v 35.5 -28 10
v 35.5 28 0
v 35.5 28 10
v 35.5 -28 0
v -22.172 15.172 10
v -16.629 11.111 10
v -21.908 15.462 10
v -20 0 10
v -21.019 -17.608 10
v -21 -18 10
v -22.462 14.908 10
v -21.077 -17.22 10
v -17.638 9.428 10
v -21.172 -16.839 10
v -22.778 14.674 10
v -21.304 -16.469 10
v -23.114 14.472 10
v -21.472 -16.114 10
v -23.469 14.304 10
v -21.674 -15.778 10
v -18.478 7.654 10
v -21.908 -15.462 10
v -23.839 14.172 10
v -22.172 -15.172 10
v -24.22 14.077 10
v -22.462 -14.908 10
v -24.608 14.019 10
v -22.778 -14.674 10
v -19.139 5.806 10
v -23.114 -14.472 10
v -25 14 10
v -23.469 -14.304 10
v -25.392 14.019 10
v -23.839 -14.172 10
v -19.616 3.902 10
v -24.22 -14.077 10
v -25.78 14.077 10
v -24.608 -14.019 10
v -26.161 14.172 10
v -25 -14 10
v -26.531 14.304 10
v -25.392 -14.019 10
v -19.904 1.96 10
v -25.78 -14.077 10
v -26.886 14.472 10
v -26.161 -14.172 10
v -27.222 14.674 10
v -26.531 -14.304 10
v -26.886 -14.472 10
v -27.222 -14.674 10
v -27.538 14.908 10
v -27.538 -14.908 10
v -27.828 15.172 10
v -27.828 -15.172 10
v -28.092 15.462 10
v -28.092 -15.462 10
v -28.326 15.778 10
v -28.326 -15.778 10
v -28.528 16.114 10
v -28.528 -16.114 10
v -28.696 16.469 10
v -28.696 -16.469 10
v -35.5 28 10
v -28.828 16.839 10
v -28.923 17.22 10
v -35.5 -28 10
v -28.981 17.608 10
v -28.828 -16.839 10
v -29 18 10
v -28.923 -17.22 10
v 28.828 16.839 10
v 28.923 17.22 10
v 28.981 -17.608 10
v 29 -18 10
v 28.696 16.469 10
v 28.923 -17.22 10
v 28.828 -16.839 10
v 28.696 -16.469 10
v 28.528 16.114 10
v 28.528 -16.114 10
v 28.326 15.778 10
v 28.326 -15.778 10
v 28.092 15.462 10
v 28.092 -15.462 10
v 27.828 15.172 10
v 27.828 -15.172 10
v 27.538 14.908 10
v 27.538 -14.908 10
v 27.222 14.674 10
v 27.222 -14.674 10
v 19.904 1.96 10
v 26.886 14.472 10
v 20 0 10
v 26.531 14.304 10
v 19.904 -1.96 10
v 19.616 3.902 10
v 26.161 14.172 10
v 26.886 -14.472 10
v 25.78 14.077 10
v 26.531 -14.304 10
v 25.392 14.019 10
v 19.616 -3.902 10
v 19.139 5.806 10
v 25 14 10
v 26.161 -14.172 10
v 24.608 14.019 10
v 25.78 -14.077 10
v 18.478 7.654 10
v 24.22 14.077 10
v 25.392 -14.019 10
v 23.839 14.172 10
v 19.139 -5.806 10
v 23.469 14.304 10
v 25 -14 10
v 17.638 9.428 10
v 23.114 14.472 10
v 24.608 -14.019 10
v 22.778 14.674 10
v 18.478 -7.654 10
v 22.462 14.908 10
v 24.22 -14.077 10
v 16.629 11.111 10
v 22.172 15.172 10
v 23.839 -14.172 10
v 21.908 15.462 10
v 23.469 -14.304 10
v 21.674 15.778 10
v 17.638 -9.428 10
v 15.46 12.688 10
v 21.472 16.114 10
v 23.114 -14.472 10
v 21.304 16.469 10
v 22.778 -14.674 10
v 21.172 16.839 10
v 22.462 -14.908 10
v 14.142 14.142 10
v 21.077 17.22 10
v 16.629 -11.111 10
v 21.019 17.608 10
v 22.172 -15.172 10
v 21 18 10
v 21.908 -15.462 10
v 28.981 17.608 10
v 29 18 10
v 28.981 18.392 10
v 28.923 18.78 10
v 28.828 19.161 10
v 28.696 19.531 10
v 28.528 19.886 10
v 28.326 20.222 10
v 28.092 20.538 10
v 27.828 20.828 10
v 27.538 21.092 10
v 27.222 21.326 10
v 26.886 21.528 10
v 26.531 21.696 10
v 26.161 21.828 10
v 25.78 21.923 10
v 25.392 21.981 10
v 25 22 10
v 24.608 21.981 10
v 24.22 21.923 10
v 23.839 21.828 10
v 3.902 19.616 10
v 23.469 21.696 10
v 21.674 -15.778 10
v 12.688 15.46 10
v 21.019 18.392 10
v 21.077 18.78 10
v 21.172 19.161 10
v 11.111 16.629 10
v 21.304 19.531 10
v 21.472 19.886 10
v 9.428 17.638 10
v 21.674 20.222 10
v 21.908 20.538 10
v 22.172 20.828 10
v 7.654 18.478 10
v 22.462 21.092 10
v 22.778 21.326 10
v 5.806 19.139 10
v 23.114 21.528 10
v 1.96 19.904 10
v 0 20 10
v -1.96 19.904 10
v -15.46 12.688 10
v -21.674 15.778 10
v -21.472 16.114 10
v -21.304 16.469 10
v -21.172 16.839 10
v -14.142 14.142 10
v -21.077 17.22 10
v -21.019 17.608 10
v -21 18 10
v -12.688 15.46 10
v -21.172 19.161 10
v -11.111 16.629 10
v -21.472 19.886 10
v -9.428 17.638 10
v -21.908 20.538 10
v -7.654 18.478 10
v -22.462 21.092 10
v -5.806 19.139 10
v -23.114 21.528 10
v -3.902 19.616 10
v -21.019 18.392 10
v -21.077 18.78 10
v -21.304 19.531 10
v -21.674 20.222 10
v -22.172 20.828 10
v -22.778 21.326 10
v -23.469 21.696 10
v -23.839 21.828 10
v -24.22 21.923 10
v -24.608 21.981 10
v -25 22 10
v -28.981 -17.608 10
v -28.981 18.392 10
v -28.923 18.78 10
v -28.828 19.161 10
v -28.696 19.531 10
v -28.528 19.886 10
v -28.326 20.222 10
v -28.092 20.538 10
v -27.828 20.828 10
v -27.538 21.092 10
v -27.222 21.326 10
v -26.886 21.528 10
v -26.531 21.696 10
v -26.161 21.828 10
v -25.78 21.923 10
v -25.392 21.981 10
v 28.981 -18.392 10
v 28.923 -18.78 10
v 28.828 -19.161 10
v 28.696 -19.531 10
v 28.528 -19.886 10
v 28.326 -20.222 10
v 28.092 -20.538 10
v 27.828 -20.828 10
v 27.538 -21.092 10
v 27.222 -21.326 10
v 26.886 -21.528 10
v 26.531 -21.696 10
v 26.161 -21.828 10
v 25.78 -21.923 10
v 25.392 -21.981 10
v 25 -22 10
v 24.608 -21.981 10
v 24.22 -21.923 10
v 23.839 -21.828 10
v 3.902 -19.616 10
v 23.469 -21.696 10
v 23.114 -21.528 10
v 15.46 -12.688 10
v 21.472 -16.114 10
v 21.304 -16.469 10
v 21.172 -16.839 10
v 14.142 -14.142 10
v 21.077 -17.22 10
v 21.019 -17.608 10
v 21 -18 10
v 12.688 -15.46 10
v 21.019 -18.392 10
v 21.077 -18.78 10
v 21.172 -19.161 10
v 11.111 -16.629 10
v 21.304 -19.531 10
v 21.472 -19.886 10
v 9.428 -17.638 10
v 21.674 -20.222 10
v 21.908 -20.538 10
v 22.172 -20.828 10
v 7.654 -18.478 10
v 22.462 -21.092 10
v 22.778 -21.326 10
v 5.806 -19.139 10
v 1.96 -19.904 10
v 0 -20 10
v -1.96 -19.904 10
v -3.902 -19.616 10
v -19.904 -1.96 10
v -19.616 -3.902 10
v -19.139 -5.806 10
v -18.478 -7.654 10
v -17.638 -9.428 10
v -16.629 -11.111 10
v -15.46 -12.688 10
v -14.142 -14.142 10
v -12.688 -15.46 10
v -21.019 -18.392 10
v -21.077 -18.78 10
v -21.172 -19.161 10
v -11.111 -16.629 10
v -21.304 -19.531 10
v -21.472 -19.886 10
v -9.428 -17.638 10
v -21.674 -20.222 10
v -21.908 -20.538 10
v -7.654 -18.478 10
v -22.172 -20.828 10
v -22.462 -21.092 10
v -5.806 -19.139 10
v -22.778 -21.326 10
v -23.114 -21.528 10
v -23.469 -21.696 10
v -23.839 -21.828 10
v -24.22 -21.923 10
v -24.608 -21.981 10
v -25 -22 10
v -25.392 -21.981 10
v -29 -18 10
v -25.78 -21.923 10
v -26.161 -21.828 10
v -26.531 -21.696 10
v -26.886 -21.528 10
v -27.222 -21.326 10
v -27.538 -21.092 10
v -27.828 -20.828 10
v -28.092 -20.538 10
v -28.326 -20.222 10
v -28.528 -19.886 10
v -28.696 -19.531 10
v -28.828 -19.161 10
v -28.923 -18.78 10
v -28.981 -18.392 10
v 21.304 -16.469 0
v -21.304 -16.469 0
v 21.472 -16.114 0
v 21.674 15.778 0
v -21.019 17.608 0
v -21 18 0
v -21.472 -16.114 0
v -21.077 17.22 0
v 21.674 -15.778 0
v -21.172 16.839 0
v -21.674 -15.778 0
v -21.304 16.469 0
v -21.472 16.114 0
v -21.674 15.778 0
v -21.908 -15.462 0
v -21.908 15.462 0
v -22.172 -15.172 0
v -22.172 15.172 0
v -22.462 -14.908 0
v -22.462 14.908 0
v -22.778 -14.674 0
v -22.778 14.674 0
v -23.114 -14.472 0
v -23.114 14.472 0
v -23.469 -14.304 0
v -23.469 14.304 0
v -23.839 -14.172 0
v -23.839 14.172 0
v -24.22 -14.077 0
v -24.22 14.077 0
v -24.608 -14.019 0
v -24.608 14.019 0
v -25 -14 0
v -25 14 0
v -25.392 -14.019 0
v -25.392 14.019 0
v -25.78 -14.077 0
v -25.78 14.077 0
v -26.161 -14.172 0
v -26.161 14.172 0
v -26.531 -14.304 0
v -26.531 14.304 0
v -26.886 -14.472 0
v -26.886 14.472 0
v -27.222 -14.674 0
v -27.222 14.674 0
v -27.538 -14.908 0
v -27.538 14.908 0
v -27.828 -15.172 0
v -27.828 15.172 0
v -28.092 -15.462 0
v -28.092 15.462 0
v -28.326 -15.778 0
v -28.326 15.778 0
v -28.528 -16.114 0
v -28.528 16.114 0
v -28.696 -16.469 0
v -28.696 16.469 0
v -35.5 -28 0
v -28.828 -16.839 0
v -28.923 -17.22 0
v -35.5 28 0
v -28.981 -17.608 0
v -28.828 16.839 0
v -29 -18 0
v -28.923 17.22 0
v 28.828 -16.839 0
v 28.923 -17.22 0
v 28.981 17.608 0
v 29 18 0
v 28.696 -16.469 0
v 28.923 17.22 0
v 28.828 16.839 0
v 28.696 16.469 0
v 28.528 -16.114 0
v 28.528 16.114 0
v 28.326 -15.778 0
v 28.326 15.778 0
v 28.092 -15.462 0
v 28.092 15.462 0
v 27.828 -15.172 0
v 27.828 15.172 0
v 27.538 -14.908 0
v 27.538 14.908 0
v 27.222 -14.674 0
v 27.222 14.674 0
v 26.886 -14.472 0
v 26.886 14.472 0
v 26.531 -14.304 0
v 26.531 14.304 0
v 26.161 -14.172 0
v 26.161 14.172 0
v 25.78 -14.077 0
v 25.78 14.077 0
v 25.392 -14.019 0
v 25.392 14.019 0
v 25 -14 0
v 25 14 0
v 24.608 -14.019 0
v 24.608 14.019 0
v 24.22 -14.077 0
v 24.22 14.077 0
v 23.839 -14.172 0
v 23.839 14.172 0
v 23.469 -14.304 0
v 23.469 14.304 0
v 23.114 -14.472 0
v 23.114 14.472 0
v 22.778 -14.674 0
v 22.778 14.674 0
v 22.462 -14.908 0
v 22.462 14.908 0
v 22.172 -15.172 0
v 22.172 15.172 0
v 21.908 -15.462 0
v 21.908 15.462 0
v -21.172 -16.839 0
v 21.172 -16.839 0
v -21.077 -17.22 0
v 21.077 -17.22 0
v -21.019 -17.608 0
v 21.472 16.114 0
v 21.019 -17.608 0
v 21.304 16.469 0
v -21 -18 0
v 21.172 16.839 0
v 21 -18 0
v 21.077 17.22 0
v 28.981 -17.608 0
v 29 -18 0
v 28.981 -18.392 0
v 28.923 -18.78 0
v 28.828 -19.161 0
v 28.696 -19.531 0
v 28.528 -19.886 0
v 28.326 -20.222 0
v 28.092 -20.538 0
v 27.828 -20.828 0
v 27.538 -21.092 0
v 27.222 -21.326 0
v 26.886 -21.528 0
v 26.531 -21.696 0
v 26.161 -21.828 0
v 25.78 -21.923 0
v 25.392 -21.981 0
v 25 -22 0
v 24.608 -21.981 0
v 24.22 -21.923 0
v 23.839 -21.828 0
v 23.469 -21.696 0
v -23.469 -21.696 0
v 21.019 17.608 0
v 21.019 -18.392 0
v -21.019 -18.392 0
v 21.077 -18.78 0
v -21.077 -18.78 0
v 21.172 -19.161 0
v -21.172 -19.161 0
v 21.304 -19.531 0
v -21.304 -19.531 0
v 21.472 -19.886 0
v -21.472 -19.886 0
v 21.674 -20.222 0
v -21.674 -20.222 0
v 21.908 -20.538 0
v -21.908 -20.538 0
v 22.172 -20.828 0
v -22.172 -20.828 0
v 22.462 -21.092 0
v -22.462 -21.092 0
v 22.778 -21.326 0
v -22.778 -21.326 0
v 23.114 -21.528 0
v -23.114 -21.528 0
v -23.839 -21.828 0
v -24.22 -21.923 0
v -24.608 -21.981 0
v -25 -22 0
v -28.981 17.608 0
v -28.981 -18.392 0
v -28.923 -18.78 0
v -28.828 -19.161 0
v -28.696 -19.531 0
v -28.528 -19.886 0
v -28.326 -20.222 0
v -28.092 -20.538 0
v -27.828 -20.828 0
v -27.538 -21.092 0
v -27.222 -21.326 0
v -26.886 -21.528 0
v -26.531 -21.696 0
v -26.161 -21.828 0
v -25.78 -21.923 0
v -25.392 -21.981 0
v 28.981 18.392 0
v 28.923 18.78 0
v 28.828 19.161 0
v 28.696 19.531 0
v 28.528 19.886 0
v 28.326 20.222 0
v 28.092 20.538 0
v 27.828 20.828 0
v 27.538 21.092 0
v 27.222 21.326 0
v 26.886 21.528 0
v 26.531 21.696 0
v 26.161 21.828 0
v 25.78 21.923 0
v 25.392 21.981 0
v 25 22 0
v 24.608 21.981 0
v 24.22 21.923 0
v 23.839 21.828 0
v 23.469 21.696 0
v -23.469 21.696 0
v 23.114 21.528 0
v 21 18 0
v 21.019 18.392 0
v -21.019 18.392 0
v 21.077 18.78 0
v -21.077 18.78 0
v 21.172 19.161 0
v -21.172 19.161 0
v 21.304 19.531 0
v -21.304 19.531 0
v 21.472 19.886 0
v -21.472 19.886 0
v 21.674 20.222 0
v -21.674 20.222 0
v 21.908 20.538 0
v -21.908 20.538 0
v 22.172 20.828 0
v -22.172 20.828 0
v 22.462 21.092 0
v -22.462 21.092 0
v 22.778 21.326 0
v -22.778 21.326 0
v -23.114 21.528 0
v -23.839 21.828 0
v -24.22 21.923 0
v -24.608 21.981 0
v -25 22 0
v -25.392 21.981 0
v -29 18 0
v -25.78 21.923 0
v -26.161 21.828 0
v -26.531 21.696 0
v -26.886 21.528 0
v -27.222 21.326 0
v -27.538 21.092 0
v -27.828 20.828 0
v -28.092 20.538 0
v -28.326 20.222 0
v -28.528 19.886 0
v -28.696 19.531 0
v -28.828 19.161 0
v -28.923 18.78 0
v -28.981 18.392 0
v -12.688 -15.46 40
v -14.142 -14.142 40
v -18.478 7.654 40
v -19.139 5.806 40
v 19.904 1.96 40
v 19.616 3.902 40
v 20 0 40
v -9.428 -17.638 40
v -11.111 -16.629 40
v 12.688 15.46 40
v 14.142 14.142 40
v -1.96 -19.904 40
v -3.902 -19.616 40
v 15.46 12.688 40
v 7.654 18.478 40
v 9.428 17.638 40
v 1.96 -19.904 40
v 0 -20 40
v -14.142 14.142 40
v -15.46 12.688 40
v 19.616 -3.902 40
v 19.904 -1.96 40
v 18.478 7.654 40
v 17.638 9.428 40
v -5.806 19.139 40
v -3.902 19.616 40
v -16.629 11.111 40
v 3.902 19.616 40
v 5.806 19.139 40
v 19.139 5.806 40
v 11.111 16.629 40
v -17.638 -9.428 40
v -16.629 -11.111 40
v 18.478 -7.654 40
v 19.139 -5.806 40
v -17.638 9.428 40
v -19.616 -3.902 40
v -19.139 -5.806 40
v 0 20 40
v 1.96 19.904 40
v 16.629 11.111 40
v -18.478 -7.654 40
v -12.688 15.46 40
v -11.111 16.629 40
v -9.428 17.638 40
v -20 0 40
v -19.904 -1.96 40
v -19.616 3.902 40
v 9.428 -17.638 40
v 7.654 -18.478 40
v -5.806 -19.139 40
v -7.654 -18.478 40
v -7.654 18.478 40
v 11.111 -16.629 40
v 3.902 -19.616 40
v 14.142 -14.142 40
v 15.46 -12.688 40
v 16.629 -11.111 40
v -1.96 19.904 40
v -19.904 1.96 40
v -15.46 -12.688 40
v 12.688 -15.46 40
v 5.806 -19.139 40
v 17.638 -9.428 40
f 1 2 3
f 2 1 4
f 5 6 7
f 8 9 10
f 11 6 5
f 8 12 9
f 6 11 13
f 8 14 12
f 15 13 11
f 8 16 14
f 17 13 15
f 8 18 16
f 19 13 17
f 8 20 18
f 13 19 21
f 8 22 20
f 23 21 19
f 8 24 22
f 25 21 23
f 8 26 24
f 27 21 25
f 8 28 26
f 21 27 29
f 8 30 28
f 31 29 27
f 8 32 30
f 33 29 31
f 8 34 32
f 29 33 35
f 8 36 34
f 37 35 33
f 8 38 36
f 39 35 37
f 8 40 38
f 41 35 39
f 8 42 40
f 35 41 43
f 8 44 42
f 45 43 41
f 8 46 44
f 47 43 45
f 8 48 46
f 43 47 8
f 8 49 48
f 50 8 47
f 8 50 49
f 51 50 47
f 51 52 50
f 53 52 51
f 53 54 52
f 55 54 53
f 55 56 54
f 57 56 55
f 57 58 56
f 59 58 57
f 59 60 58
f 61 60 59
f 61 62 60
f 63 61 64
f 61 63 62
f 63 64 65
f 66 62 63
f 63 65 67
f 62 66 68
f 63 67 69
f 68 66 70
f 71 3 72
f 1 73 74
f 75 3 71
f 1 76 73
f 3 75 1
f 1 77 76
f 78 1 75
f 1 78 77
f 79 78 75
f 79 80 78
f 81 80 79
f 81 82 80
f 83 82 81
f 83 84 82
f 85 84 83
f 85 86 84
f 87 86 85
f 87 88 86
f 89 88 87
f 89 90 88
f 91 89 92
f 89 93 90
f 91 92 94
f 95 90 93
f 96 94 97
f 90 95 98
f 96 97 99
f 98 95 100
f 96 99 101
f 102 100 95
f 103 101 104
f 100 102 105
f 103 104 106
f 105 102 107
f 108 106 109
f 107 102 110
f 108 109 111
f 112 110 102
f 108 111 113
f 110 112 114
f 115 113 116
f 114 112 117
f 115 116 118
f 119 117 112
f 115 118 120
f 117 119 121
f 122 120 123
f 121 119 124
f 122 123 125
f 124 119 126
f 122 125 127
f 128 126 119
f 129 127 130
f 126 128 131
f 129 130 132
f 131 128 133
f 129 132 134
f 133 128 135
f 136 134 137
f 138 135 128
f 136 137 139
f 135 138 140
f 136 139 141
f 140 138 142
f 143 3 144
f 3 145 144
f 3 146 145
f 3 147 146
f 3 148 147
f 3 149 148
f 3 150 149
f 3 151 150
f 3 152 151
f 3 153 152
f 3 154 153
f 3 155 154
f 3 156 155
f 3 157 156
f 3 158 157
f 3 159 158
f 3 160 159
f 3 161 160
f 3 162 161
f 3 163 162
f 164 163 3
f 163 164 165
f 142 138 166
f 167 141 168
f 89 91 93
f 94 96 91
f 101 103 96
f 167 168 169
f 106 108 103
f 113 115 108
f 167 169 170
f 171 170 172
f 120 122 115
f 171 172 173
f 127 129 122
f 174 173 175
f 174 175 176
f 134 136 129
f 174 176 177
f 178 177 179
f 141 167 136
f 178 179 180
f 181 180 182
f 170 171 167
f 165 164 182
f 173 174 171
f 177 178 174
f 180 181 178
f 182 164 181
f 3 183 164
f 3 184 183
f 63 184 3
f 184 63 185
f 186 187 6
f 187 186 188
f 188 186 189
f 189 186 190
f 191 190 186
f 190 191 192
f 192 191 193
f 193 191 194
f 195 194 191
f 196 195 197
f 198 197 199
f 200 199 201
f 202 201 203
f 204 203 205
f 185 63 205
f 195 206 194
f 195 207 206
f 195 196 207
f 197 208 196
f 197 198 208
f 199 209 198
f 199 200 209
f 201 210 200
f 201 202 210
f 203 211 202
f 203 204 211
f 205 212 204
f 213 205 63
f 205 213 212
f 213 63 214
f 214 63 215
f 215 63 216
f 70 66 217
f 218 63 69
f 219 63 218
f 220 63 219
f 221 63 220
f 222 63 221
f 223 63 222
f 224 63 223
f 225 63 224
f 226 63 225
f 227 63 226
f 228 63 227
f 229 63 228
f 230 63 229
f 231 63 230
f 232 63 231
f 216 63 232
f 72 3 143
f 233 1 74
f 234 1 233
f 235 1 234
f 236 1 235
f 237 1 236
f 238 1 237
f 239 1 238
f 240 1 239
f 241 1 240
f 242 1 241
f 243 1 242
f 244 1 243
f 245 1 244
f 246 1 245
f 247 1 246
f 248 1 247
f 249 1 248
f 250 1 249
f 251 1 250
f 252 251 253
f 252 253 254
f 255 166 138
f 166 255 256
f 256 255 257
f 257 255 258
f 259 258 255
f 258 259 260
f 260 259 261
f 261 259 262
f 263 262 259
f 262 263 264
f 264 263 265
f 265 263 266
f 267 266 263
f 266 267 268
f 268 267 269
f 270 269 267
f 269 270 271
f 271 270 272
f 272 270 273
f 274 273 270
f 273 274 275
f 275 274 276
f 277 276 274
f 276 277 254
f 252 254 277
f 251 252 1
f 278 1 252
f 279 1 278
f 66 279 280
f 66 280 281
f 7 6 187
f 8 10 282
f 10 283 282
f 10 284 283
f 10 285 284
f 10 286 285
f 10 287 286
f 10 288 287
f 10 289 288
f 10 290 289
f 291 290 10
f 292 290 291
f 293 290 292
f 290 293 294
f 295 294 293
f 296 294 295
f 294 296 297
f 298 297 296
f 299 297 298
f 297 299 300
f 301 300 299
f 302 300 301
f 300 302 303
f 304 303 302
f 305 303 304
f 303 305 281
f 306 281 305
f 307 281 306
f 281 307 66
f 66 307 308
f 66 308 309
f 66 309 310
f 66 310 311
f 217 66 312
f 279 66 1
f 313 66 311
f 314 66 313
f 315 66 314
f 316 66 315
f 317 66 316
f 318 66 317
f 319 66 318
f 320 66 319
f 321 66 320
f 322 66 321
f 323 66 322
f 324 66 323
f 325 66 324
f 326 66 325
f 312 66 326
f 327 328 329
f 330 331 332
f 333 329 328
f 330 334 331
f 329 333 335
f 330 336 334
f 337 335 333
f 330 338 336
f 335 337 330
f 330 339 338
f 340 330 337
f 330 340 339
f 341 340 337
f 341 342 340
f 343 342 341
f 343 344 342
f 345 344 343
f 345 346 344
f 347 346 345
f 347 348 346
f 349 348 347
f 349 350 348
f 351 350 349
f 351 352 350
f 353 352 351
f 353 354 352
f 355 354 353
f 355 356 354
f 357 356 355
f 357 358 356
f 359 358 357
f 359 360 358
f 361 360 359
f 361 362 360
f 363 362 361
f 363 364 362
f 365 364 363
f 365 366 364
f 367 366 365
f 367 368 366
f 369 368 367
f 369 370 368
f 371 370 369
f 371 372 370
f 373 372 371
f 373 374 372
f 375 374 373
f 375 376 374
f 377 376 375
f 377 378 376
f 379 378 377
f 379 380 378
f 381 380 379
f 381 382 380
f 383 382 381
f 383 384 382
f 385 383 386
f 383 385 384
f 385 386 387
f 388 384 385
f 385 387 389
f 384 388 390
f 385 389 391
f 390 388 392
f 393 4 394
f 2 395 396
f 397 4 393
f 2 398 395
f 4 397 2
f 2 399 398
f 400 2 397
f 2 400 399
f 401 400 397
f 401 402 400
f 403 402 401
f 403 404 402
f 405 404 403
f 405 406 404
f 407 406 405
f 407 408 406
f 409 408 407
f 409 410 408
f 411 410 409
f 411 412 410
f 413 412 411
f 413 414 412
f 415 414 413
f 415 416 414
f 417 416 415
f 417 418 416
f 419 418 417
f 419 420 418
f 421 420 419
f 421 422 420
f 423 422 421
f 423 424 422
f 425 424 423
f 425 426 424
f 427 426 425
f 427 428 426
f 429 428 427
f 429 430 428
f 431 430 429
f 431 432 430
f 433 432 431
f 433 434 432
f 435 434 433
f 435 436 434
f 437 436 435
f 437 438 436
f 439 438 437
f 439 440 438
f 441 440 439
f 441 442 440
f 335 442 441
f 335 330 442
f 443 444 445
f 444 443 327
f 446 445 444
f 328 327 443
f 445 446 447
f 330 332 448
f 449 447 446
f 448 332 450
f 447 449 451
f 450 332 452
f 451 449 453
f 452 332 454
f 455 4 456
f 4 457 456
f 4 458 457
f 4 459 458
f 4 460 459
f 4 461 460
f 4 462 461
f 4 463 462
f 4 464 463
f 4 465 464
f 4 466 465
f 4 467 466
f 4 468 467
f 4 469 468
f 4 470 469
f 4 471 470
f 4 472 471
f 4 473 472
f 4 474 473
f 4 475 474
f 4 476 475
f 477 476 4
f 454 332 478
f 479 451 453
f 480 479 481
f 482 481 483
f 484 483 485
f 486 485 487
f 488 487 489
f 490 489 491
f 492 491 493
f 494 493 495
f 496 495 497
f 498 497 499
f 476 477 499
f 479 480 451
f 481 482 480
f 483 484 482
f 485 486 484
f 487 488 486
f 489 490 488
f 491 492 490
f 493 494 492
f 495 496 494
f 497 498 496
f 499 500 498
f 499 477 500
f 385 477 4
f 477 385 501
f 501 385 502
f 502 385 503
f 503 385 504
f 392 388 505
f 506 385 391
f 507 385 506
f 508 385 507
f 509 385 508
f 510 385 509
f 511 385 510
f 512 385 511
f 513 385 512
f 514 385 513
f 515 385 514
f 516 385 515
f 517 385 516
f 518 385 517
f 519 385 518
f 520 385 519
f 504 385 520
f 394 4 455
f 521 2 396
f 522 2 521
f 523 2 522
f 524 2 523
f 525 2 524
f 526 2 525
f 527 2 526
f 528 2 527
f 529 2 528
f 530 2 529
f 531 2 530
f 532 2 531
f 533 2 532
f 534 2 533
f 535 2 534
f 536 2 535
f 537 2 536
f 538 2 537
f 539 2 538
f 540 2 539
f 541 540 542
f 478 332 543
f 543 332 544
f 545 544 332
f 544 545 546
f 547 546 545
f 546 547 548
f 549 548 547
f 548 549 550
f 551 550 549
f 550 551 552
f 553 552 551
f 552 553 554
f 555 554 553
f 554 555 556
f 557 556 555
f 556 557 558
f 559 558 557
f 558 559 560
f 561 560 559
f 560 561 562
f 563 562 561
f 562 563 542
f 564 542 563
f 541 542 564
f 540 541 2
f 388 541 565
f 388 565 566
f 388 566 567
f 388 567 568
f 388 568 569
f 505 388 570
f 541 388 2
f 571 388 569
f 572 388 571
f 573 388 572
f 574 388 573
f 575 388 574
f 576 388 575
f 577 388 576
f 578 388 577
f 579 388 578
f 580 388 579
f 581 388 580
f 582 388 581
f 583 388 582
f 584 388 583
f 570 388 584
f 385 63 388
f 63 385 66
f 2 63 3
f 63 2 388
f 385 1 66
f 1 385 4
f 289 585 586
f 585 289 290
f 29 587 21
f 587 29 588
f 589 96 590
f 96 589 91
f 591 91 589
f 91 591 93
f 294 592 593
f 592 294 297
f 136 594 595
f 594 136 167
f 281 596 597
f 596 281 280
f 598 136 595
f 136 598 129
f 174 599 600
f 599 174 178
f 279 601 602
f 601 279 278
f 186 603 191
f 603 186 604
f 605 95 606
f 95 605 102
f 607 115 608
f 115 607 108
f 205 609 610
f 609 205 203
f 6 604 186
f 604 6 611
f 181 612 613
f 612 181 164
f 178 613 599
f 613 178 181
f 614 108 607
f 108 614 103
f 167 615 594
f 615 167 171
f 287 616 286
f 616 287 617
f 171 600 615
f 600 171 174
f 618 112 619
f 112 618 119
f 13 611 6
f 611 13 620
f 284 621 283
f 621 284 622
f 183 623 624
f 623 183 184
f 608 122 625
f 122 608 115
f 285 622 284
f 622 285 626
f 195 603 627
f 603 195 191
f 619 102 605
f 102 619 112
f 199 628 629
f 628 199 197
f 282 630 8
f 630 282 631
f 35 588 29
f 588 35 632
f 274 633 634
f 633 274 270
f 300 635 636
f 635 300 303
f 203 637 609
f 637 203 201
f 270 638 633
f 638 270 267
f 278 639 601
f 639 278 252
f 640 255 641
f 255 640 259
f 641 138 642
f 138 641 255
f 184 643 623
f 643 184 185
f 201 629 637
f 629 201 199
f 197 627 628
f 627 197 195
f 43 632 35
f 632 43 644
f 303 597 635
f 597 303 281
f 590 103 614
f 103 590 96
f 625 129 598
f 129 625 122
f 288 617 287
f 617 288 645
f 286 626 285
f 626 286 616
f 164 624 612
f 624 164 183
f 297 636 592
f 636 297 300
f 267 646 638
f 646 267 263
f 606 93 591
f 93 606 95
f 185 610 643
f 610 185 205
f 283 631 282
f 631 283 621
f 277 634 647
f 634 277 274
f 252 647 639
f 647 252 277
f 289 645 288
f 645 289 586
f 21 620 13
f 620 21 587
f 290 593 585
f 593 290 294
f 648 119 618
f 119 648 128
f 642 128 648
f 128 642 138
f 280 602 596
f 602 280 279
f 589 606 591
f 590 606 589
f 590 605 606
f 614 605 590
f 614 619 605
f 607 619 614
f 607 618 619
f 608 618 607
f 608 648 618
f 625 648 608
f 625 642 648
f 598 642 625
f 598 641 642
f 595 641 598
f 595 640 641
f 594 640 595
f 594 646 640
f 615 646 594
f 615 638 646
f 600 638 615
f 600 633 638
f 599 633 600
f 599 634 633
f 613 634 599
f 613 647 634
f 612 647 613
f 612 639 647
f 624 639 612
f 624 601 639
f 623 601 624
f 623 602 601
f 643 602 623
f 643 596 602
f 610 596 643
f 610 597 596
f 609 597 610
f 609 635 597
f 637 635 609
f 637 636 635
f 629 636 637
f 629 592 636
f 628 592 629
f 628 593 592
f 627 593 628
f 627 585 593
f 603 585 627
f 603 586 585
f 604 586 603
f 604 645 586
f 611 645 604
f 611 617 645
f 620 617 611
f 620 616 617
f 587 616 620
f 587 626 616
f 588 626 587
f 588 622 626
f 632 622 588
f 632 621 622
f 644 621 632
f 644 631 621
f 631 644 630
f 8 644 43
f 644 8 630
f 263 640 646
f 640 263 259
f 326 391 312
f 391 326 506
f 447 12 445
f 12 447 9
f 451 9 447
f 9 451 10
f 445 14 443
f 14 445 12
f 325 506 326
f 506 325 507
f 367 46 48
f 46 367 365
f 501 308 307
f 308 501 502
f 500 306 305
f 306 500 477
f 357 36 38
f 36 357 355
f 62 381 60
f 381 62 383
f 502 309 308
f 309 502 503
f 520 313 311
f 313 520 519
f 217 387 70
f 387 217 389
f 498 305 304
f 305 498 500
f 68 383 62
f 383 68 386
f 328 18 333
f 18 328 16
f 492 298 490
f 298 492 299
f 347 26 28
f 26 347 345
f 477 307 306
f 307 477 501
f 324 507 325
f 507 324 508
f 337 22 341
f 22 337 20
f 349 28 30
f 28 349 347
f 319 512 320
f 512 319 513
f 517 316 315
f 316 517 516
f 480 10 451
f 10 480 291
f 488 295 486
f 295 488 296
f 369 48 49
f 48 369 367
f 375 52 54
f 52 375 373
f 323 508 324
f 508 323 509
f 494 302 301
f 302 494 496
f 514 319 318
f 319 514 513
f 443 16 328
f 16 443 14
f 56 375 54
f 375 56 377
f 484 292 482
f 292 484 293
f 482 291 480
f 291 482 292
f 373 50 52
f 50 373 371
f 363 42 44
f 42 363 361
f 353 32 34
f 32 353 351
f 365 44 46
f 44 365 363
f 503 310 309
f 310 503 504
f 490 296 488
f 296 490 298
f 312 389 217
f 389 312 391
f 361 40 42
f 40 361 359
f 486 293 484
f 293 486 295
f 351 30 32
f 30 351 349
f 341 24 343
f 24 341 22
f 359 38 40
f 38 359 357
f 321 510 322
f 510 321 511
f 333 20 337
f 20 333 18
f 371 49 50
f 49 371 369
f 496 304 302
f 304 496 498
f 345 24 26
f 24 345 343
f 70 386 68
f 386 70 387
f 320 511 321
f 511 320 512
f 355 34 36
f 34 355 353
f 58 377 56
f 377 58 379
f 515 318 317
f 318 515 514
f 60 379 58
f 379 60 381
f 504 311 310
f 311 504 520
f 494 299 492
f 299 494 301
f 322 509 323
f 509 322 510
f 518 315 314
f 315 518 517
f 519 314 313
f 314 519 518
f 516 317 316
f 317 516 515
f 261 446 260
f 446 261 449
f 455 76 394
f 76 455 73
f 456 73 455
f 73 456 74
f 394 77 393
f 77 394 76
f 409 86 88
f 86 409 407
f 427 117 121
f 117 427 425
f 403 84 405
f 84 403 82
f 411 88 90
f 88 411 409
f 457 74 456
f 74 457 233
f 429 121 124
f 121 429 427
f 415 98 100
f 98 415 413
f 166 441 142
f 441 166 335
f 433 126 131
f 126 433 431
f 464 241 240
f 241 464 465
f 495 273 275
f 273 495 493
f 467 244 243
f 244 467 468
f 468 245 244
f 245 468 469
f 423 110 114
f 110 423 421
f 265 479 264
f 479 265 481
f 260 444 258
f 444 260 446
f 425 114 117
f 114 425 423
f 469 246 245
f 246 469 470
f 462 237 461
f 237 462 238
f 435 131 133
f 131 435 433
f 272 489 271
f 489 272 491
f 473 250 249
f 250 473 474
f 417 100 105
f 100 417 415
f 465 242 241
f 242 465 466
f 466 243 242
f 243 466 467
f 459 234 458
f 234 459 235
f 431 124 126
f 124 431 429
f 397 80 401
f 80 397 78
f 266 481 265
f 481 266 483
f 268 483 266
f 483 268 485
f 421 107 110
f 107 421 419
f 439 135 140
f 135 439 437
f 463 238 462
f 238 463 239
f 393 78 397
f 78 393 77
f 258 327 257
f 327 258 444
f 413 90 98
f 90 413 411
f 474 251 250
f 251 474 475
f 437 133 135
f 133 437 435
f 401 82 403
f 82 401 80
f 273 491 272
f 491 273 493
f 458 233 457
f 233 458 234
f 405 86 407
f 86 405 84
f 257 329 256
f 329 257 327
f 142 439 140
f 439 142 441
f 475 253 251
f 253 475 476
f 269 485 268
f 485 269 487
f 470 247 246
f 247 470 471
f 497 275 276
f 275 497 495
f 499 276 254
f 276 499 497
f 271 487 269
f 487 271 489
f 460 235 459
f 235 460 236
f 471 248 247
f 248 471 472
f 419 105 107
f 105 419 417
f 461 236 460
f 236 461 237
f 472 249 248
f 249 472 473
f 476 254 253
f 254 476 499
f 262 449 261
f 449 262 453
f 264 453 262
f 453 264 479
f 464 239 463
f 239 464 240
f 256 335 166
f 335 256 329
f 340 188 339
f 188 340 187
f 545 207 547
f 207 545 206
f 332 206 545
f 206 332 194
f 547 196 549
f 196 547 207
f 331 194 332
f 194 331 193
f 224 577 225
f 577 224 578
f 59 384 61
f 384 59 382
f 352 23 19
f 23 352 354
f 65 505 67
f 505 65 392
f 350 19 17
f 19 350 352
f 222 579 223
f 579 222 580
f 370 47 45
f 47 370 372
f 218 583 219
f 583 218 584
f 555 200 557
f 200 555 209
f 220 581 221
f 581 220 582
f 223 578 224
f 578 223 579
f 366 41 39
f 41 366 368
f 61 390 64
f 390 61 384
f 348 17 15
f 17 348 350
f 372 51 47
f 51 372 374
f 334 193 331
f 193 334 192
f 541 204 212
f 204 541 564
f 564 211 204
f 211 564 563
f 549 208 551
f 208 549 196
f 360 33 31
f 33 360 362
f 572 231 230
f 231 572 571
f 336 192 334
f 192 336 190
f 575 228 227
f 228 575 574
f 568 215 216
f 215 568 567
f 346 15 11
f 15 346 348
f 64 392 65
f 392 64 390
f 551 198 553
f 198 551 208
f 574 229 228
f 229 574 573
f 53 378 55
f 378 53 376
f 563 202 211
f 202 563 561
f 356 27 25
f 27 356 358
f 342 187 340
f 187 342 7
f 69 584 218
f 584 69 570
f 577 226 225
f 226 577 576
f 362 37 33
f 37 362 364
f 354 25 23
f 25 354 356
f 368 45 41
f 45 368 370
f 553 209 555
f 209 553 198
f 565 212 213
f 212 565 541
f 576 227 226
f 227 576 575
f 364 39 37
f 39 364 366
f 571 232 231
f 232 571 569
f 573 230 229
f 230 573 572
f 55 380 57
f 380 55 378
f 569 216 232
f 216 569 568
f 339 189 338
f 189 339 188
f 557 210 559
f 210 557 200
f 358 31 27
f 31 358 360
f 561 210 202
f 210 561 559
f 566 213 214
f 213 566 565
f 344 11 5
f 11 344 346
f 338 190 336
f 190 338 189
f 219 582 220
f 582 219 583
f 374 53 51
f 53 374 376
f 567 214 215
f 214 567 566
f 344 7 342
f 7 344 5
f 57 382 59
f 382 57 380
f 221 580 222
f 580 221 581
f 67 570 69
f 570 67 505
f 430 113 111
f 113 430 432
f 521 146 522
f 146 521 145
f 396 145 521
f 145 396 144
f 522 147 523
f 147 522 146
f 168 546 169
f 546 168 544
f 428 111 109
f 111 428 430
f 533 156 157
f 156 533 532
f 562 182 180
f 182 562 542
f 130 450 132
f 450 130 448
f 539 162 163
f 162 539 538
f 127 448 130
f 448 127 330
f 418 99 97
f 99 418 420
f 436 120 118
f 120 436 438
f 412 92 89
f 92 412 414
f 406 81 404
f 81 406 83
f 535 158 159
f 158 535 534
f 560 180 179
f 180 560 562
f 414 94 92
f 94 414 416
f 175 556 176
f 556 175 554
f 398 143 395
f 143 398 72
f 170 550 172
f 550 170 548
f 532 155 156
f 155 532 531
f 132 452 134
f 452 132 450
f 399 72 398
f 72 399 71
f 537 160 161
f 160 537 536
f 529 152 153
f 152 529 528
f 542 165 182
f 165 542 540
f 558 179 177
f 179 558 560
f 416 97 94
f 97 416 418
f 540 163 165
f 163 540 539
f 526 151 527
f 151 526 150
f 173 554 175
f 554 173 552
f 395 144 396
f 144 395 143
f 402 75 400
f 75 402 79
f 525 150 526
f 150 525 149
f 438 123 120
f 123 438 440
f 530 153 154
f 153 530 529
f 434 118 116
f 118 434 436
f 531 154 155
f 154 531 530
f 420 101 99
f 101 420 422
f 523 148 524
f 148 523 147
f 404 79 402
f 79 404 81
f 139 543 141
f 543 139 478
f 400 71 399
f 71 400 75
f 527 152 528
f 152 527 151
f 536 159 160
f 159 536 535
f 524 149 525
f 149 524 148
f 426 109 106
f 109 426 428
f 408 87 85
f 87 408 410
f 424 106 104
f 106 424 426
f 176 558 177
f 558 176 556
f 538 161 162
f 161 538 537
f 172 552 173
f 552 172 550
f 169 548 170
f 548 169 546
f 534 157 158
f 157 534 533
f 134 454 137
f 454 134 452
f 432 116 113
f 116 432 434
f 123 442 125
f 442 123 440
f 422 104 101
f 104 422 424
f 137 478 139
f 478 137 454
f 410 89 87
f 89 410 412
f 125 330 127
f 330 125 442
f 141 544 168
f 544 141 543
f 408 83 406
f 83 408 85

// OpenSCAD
module pillow_block_bearing() {
    difference() {
        union() {
            // Base
            translate([-35.5, -28, 0])
                cube([71, 56, 10]);
            
            // Bearing housing
            translate([0, 0, 10])
                cylinder(h=30, d=40, $fn=64);
            
            // Shaft hole
            translate([0, 0, 10])
                cylinder(h=30, d=12, $fn=64);
        }
        
        // Mounting holes
        translate([-25, -18, 0])
            cylinder(h=10, d=8, $fn=64);
        translate([25, -18, 0])
            cylinder(h=10, d=8, $fn=64);
        translate([-25, 18, 0])
            cylinder(h=10, d=8, $fn=64);
        translate([25, 18, 0])
            cylinder(h=10, d=8, $fn=64);
    }
}

pillow_block_bearing();
